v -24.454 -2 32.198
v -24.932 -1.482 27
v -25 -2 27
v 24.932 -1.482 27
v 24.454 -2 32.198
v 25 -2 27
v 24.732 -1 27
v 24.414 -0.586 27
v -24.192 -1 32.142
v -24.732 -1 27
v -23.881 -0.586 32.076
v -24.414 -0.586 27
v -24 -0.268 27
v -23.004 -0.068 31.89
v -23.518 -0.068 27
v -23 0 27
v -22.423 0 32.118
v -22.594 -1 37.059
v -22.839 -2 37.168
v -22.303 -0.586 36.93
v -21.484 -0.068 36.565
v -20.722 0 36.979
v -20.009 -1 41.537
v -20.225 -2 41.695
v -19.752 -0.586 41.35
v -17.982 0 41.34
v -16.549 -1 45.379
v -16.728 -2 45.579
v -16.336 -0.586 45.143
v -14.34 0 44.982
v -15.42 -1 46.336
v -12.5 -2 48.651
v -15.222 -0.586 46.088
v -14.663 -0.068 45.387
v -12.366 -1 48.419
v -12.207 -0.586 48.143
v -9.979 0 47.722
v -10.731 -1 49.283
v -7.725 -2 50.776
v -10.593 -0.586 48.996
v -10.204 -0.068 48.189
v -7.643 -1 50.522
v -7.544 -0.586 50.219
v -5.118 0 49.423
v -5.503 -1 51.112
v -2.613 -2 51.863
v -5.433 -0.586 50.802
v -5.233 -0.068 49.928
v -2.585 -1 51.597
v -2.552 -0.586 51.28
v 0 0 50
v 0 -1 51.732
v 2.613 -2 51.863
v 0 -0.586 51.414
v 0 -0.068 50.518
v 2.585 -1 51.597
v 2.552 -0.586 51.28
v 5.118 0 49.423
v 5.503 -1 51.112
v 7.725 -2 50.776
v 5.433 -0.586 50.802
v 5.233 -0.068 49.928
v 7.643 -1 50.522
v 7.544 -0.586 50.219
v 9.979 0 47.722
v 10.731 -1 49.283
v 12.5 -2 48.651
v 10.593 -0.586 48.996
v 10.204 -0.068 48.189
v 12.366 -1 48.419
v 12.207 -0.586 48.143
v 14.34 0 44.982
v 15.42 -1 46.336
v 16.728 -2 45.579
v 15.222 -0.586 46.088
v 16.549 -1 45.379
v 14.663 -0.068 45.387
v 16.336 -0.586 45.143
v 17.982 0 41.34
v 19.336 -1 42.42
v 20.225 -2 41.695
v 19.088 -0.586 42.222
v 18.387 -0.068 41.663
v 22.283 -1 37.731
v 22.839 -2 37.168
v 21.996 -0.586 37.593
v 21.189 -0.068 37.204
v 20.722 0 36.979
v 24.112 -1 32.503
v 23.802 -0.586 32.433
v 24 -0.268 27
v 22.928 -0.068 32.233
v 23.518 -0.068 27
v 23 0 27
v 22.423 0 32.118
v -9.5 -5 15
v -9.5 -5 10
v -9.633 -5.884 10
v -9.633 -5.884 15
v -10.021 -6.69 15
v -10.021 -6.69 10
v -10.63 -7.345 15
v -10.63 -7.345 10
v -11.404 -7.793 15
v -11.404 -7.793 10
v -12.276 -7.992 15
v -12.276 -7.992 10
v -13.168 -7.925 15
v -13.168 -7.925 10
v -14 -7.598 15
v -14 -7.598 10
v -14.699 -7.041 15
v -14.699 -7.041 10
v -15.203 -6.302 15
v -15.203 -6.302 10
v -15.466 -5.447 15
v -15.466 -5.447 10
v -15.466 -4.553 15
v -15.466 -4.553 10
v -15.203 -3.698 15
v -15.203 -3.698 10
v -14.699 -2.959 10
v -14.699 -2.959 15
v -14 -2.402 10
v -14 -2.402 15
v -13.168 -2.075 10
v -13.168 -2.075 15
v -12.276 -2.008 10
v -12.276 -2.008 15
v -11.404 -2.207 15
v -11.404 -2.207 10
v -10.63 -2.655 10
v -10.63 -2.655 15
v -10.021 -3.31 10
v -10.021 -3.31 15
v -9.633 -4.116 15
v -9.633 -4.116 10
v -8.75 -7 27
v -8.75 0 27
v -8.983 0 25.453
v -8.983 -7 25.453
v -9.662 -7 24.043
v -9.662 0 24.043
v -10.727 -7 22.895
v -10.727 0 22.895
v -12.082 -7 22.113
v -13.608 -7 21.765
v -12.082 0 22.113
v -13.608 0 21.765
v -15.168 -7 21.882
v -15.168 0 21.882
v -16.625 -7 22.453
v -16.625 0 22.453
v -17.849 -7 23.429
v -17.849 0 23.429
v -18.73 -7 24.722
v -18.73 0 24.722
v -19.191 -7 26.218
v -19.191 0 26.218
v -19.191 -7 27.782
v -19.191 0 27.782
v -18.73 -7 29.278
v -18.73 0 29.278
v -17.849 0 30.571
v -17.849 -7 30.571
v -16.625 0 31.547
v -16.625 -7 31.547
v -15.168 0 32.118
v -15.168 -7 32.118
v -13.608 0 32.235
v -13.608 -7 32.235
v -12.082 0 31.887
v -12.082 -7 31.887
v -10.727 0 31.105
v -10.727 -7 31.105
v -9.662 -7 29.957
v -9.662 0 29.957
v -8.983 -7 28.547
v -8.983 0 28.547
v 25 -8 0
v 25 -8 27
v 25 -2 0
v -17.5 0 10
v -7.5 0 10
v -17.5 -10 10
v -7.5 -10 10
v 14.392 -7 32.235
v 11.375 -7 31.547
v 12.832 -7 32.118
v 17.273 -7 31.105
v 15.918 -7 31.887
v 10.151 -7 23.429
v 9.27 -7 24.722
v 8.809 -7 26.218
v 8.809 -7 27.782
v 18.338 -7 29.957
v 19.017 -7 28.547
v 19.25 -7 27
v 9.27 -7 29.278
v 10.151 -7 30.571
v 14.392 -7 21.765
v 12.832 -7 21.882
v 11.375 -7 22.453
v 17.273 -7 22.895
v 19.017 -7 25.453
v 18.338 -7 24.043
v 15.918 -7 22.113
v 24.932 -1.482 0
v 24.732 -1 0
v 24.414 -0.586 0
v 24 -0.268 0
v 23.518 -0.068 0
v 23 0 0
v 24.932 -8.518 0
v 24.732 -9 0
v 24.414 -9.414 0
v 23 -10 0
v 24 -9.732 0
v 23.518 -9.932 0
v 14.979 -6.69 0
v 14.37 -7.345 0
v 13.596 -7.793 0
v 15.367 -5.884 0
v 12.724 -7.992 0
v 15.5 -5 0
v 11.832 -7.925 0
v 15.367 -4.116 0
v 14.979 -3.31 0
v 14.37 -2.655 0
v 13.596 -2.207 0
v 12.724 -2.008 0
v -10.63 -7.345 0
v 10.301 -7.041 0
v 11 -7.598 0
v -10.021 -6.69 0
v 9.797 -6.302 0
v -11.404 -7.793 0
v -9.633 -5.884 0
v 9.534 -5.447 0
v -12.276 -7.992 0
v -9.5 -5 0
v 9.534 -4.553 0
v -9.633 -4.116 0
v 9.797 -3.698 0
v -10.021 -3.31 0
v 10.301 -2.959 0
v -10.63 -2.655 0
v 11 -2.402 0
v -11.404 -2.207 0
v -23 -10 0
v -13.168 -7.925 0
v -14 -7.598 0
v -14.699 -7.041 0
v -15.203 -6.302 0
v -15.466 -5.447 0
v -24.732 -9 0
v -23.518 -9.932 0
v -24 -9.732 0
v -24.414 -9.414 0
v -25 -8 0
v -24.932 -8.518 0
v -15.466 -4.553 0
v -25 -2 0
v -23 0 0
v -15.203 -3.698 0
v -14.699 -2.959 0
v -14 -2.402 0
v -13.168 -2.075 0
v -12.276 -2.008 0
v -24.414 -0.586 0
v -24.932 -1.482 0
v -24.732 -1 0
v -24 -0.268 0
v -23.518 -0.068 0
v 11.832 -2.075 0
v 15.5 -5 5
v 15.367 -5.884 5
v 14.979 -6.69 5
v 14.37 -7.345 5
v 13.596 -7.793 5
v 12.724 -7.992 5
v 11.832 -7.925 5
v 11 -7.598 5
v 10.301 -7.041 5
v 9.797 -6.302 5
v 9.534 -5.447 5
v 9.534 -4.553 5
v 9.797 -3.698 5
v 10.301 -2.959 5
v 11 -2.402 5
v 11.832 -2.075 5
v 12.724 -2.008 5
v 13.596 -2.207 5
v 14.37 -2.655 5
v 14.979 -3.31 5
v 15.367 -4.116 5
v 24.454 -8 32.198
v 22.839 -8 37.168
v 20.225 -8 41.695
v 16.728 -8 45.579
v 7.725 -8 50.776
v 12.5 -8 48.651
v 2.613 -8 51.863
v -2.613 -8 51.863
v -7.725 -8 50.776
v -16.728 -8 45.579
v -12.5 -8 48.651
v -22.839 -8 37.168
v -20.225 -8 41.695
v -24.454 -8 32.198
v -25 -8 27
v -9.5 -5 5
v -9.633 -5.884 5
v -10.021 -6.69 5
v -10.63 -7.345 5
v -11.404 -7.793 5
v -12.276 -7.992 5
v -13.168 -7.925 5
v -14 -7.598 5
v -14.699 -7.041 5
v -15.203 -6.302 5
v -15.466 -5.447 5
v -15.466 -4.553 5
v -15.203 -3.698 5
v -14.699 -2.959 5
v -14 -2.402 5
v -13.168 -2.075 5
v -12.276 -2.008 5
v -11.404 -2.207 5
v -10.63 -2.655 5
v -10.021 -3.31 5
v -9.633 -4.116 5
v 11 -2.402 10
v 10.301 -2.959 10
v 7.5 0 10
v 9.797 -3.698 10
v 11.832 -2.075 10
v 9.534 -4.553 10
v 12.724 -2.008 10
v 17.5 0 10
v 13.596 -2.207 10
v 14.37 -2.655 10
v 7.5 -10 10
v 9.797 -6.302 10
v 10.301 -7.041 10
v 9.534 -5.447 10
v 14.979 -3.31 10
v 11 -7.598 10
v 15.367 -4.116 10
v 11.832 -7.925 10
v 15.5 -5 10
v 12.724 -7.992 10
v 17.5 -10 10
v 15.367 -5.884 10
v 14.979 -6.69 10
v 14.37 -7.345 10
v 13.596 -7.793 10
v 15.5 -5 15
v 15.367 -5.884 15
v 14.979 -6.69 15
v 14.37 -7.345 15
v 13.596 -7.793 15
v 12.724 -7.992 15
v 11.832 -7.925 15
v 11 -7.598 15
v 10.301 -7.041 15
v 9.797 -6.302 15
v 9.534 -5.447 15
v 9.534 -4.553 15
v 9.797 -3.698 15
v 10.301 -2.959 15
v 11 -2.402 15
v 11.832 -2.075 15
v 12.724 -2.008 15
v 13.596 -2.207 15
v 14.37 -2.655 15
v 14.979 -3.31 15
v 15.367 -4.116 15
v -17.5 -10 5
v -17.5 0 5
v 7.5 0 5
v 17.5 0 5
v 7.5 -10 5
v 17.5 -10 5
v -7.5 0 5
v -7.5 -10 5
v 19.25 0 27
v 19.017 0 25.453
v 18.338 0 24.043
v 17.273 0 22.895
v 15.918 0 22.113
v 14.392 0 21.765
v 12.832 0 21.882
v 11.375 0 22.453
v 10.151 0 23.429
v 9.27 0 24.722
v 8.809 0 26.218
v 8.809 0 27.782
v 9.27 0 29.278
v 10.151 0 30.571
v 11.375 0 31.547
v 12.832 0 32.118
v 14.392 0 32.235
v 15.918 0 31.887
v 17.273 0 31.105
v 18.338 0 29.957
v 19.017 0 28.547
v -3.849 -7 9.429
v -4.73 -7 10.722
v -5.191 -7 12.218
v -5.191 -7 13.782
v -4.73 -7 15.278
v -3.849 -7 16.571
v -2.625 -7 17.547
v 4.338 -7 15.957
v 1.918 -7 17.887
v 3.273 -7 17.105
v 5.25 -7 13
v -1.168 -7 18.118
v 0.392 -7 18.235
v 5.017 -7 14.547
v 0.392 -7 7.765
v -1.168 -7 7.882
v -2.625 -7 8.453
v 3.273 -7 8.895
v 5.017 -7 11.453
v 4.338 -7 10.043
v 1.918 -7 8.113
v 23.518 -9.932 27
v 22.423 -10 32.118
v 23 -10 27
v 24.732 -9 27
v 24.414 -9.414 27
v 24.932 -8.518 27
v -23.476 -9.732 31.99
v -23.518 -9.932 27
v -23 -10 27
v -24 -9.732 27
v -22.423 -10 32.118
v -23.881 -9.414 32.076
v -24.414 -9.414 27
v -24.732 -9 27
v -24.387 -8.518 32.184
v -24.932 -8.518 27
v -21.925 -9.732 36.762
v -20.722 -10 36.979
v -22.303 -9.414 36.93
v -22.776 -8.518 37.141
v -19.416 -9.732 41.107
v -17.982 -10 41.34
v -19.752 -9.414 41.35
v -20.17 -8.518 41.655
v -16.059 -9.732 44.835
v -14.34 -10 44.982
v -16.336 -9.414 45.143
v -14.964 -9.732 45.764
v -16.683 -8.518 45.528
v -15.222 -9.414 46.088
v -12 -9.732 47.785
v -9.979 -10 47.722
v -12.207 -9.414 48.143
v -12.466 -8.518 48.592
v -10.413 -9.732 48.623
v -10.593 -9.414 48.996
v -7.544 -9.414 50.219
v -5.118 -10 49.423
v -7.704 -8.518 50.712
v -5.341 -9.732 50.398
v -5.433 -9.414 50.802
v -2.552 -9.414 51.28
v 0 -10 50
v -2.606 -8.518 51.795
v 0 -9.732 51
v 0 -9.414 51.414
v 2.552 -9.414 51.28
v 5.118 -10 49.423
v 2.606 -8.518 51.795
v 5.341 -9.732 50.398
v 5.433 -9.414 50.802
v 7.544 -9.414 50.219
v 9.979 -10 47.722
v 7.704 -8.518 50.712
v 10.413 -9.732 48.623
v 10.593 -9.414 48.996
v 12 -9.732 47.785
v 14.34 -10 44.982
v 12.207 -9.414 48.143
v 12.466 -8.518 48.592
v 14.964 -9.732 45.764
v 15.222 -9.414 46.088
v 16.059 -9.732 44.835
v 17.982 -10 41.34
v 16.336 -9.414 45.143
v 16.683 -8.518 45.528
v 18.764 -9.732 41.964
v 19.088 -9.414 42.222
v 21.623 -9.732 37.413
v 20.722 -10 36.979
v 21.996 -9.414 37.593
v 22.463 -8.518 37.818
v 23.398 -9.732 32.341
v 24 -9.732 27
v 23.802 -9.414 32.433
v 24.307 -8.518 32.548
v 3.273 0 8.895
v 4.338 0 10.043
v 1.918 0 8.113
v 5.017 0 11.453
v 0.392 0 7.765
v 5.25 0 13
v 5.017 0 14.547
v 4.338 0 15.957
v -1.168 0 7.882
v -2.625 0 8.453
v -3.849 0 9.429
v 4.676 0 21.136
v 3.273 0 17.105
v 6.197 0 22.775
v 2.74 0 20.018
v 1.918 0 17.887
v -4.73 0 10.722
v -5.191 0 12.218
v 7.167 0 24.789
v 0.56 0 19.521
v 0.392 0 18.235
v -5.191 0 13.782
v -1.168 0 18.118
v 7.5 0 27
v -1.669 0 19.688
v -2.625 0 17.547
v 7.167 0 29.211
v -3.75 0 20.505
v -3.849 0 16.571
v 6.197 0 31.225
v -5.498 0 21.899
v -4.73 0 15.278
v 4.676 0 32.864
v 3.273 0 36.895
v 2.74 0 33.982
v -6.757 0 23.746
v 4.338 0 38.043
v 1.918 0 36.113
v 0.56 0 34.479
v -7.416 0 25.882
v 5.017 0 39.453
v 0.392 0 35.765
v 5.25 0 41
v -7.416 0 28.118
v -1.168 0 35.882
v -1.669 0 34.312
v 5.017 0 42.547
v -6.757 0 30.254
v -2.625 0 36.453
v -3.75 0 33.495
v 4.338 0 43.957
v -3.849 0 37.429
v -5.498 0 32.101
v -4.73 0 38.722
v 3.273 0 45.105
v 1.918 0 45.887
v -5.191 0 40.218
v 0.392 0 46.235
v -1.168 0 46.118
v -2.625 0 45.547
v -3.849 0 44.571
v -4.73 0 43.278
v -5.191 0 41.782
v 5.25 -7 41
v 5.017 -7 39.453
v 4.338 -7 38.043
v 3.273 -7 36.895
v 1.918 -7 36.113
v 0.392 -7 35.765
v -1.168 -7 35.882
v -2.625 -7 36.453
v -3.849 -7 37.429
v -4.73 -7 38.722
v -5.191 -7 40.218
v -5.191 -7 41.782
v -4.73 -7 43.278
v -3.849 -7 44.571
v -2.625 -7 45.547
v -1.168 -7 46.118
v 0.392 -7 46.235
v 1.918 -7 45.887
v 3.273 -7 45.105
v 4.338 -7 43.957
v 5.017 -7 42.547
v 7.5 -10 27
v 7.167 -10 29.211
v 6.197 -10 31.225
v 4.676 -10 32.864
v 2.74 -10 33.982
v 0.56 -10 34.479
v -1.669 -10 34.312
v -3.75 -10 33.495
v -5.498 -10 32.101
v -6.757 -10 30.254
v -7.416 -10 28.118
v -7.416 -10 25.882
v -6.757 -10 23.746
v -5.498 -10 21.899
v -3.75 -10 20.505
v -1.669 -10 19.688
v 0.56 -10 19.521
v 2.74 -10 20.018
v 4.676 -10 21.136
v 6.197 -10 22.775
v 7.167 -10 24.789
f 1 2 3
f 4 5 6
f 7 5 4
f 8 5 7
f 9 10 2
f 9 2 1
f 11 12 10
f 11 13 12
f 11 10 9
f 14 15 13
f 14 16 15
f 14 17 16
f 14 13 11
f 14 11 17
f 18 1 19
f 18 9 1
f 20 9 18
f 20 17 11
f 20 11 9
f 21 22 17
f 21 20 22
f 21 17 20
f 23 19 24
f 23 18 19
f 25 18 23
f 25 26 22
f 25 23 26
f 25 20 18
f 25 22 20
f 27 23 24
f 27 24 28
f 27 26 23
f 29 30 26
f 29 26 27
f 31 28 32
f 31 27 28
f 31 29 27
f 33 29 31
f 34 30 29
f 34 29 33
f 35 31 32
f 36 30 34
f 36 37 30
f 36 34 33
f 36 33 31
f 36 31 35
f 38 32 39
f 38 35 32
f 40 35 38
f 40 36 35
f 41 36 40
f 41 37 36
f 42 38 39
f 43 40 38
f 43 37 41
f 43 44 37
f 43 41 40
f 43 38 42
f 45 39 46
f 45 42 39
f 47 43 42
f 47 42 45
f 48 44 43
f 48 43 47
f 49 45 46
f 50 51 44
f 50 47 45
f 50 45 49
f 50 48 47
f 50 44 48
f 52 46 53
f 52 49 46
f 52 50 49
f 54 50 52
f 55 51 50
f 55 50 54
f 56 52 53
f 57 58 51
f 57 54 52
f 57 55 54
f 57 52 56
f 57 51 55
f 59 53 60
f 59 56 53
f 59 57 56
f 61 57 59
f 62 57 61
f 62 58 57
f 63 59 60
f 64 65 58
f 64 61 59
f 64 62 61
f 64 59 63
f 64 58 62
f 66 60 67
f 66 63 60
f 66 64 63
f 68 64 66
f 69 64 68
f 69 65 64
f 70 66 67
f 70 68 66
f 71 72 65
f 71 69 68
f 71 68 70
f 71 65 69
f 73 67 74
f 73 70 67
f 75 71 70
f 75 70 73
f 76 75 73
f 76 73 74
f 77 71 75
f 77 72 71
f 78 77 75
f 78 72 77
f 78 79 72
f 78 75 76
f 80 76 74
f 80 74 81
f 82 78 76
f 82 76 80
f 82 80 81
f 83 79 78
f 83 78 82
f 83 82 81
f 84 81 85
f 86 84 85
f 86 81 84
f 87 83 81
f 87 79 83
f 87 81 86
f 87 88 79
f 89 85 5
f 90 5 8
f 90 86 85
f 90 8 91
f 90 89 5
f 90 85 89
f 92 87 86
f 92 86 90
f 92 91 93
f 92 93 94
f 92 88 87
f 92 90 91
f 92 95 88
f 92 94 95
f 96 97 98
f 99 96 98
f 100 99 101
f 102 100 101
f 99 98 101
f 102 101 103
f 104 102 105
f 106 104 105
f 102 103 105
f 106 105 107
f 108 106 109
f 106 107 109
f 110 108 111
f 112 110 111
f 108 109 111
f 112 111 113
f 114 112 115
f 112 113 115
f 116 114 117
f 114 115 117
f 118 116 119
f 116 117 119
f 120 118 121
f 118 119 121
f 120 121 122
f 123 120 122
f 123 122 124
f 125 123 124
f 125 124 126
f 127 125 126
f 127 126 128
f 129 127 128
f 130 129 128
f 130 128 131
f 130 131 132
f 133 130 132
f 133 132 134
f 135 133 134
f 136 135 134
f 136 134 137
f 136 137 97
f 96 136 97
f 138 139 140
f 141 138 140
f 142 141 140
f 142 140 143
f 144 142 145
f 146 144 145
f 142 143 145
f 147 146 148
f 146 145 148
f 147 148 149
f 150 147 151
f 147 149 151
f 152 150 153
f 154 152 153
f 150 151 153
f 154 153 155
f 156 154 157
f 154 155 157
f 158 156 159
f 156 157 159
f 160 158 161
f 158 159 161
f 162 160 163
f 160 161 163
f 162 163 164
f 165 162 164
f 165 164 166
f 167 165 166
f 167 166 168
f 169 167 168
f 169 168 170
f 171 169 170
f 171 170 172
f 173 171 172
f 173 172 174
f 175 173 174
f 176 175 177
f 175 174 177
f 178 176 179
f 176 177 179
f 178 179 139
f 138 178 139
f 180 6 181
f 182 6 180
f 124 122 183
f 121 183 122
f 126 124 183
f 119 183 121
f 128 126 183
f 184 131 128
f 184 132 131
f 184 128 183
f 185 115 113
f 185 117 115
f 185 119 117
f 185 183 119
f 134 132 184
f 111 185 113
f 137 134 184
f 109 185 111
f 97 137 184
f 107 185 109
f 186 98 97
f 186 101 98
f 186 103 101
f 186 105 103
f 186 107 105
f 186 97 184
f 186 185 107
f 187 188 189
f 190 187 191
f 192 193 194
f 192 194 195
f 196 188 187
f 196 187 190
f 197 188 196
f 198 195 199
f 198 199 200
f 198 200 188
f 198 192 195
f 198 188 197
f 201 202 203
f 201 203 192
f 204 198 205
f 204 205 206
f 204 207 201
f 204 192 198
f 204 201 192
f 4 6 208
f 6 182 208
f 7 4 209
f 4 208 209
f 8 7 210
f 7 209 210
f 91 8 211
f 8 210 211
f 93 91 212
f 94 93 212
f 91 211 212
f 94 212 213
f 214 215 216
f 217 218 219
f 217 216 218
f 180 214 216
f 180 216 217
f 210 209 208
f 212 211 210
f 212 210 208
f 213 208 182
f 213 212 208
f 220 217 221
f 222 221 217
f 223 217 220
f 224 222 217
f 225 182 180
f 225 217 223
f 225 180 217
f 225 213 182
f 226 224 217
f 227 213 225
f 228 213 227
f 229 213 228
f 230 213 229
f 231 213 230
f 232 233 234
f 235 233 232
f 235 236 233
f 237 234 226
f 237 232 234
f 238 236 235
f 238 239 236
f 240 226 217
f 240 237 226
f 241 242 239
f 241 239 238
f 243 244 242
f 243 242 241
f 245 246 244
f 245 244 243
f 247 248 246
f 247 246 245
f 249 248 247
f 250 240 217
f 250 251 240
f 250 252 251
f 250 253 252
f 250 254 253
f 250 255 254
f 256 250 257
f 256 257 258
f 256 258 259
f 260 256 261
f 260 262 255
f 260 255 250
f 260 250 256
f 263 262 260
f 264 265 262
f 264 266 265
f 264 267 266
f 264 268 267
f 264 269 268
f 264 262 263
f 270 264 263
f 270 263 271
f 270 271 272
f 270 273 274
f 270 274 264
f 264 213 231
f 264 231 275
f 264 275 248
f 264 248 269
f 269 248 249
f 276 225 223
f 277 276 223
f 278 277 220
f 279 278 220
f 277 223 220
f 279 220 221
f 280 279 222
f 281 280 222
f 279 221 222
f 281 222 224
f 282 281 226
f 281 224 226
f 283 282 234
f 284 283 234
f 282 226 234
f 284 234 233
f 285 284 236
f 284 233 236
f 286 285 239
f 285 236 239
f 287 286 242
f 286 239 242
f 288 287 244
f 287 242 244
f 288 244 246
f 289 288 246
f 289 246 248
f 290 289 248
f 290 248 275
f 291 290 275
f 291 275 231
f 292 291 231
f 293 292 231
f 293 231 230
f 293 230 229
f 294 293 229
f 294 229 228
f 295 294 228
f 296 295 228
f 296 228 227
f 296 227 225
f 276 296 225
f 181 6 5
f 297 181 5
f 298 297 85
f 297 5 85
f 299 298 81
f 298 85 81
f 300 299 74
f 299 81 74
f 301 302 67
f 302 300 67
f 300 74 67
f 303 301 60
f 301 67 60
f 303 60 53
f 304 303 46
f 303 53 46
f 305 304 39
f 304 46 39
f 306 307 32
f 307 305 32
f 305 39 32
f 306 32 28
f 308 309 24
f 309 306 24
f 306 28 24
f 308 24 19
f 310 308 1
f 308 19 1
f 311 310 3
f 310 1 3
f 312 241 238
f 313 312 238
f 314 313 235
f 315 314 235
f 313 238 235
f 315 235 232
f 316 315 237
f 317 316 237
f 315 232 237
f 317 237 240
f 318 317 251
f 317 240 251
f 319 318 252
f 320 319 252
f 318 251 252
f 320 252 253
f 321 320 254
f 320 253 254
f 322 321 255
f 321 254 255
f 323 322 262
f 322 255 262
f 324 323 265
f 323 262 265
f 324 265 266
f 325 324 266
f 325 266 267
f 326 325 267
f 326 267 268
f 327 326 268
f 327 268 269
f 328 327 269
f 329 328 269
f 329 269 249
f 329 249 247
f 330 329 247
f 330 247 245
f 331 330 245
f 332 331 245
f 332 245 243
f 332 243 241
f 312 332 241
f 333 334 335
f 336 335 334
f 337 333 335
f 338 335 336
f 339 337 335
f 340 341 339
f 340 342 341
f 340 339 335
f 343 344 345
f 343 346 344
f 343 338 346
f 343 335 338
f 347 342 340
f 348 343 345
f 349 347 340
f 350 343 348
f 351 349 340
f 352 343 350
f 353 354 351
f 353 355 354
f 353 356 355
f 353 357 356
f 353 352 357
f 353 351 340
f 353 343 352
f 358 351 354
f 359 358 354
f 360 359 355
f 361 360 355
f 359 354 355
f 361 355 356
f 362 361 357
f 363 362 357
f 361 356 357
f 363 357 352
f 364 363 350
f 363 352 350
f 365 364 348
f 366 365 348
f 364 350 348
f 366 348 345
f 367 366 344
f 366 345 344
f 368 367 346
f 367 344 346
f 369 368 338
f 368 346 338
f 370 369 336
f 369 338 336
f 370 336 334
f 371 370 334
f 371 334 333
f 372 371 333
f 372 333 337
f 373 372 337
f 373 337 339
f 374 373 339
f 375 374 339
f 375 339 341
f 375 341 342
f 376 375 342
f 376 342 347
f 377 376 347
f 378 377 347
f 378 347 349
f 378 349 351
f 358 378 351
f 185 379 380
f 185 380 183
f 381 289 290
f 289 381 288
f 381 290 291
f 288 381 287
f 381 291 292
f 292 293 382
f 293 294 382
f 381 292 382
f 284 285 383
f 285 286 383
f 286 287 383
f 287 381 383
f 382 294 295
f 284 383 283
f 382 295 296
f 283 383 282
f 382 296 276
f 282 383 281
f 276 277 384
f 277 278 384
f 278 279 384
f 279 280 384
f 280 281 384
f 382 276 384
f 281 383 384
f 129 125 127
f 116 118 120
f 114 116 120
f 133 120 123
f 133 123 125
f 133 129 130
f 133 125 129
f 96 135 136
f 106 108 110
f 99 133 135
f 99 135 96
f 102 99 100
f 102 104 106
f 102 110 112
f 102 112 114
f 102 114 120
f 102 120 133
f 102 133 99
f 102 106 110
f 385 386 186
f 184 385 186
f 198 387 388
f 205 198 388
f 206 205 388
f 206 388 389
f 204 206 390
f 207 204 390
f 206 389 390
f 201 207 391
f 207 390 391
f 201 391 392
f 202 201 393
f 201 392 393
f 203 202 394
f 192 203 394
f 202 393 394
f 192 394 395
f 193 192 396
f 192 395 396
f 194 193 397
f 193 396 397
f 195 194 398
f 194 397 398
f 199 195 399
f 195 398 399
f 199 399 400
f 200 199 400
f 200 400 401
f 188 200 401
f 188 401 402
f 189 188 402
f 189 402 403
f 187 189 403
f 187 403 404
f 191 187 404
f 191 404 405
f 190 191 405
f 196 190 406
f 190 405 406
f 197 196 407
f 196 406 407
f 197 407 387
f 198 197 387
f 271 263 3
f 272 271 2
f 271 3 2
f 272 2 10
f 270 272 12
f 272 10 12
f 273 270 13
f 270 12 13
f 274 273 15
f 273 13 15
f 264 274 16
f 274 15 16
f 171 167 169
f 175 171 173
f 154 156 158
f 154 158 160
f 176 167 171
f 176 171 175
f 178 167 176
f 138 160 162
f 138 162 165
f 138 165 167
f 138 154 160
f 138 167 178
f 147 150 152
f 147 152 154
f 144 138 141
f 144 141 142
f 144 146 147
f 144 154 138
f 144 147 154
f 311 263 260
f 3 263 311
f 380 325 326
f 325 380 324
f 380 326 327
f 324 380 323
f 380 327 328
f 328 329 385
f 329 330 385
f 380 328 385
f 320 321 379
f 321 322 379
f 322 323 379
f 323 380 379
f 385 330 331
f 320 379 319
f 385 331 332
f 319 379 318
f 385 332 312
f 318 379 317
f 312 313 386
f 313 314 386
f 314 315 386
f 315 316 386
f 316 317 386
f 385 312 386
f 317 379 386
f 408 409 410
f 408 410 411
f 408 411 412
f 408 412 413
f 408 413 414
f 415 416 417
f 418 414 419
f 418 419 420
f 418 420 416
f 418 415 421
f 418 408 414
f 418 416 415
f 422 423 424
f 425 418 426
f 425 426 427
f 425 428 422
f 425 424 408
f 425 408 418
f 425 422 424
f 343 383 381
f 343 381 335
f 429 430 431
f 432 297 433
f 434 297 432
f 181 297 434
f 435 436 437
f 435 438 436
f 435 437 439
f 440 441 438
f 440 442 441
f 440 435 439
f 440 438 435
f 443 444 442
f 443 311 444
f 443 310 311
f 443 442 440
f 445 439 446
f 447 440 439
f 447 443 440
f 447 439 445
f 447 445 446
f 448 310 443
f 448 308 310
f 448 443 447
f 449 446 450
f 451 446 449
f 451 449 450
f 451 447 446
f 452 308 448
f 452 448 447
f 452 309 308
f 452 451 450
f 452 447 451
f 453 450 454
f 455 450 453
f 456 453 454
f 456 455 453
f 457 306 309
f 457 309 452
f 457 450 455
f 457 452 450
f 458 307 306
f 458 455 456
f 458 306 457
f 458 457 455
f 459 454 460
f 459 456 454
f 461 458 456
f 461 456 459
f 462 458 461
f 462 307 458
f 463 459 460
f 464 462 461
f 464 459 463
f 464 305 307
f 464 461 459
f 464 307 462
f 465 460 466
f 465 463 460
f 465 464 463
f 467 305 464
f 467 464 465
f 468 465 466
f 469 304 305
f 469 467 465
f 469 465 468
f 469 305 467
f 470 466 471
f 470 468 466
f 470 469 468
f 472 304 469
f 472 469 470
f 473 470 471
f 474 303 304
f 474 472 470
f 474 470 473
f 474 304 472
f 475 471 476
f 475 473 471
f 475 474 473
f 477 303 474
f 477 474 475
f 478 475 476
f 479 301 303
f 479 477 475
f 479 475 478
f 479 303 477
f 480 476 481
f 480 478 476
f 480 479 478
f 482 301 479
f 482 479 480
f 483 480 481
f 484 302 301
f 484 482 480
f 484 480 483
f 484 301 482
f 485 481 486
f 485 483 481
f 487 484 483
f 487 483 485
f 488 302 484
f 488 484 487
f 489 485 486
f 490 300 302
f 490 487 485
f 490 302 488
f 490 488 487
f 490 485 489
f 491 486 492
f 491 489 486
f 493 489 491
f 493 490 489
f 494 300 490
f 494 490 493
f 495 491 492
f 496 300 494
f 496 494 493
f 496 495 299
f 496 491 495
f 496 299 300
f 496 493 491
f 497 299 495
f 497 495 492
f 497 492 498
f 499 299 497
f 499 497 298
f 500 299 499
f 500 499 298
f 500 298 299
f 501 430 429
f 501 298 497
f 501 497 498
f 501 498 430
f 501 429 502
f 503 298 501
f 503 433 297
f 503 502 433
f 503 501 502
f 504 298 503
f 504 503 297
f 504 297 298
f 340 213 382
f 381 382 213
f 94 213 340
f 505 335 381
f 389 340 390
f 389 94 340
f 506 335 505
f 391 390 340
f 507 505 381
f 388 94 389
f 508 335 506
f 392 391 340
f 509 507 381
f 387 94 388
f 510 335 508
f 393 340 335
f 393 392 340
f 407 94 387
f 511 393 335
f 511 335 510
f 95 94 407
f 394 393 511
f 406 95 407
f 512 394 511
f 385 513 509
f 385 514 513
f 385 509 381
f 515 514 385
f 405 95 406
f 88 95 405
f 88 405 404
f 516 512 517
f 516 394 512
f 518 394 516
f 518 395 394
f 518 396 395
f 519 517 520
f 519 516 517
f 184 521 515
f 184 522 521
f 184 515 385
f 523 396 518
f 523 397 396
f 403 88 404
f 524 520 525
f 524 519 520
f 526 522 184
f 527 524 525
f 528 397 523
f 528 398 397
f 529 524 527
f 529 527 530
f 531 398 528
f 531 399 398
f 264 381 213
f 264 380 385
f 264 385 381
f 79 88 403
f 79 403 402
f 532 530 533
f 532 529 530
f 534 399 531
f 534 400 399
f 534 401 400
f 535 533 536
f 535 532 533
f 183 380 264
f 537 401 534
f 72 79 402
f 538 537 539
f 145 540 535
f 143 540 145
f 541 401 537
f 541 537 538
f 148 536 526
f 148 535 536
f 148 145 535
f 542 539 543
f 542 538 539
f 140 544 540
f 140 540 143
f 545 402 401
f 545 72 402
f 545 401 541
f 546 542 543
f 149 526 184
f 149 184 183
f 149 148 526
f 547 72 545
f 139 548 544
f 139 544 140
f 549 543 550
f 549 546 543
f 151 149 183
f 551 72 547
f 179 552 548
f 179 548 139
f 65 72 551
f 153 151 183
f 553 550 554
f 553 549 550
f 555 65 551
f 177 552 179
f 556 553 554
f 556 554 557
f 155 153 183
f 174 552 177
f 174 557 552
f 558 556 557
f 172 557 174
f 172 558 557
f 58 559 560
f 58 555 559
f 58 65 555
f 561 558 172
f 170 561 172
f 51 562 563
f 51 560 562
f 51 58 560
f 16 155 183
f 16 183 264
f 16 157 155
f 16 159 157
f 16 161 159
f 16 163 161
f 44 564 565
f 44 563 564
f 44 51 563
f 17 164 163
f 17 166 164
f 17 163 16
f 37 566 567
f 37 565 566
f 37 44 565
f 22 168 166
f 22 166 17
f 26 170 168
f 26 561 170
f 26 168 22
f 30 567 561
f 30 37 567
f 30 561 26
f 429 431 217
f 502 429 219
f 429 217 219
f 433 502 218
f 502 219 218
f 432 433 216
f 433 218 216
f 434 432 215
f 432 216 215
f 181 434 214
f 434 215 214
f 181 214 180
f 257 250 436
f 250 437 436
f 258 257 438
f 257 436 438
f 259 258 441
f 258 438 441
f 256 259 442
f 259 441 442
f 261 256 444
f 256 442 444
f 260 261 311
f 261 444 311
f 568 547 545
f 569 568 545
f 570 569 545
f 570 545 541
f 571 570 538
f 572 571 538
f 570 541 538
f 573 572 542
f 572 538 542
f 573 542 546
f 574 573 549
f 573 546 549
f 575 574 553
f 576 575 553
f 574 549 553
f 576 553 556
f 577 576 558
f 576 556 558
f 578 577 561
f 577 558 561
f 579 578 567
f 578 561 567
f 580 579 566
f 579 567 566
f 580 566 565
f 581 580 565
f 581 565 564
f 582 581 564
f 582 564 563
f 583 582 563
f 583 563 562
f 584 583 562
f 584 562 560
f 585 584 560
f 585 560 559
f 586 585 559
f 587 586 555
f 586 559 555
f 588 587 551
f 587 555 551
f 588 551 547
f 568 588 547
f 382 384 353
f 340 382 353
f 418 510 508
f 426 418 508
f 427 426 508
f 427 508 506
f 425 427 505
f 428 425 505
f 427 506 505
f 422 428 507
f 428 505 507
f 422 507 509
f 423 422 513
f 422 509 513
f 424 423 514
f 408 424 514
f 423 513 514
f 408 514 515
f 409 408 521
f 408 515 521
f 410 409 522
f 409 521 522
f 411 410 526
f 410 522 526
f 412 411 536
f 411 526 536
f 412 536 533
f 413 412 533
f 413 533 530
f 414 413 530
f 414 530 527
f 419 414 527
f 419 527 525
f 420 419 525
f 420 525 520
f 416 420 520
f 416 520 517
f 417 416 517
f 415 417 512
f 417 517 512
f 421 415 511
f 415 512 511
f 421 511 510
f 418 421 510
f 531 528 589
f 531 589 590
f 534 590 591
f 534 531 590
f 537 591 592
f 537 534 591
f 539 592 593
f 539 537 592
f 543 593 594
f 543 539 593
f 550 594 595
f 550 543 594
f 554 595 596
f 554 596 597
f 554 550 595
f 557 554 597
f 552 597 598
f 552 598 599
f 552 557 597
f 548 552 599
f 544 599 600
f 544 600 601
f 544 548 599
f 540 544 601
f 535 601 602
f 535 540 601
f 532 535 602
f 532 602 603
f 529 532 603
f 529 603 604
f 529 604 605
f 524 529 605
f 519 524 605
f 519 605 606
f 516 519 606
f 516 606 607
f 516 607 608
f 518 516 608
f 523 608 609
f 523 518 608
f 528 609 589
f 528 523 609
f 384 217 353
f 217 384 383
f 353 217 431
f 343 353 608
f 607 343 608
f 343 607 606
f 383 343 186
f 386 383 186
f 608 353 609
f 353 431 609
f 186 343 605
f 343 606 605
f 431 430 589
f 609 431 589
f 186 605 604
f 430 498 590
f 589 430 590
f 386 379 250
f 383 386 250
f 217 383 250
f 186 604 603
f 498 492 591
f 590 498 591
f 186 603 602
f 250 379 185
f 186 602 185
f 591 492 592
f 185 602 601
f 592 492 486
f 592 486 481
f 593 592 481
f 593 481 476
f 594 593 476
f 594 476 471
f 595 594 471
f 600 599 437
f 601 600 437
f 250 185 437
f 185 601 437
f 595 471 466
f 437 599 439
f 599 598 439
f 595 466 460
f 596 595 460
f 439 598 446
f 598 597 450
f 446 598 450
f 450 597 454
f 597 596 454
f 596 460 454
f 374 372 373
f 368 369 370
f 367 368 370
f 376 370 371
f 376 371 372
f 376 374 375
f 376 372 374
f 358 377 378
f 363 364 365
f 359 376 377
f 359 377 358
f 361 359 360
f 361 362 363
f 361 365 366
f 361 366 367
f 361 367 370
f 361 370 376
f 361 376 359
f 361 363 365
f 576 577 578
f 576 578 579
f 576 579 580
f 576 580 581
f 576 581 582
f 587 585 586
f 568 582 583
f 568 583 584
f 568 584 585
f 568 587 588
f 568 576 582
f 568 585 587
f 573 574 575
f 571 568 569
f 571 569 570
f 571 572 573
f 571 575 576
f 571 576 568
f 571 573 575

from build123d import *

# Parameters (mm, degrees)
SKETCH_R        = 7.5
PAD_DEPTH       = 10
SKETCH002_W     = 10
SKETCH002_H     = 5
POCKET001_DEPTH = 10.001
SKETCH003_R     = 3
POCKET002_DEPTH = 15
SKETCH001_R     = 5.25
POCKET_DEPTH    = 7
FILLET_R        = 2
FILLET001_R     = 2


with BuildPart() as part:
    # Sketch → Pad (new body)
    with BuildSketch(Plane.XZ):
        with BuildLine():
            Line((-25, 0), (-25, 27))
            ThreePointArc((25, 27), (0, 52), (-25, 27))
            Line((25, 27), (25, 0))
            Line((25, 0), (-25, 0))
        make_face()
        with Locations((0, 27)):
            Circle(SKETCH_R, mode=Mode.SUBTRACT)
    extrude(amount=PAD_DEPTH)

    # Sketch002 → Pocket001 (cut, through all)
    with BuildSketch(Plane.XZ.offset(10)):
        with Locations((-12.5, 7.5)):
            Rectangle(SKETCH002_W, SKETCH002_H)
        with Locations((12.5, 7.5)):
            Rectangle(SKETCH002_W, SKETCH002_H)
    extrude(amount=-POCKET001_DEPTH, mode=Mode.SUBTRACT)

    # Sketch003 (on Face2 of Pocket001) → Pocket002 (cut)
    with BuildSketch(Plane(origin=(0, 0, 0), x_dir=(1, 0, 0), z_dir=(0, 0, -1))):
        with Locations((-12.5, 5)):
            Circle(SKETCH003_R)
        with Locations((12.5, 5)):
            Circle(SKETCH003_R)
    extrude(amount=-POCKET002_DEPTH, mode=Mode.SUBTRACT)

    # Sketch001 (on Face6 of Pad) → Pocket (cut)
    with BuildSketch(Plane(origin=(0, 0, 0), x_dir=(1, 0, 0), z_dir=(0, 1, 0))):
        with Locations((14, -27)):
            Circle(SKETCH001_R)
        with Locations((0, -13)):
            Circle(SKETCH001_R)
        with Locations((0, -41)):
            Circle(SKETCH001_R)
        with Locations((-14, -27)):
            Circle(SKETCH001_R)
    extrude(amount=-POCKET_DEPTH, mode=Mode.SUBTRACT)

    # Fillet
    fillet_edges = [part.edges().sort_by_distance(p)[0] for p in [
        (-25, 0, 13.5),
    ]]
    fillet(fillet_edges, radius=FILLET_R)

    # Fillet001
    fillet001_edges = [part.edges().sort_by_distance(p)[0] for p in [
        (25, -10, 13.5),
    ]]
    fillet(fillet001_edges, radius=FILLET001_R)


solid = part.part
